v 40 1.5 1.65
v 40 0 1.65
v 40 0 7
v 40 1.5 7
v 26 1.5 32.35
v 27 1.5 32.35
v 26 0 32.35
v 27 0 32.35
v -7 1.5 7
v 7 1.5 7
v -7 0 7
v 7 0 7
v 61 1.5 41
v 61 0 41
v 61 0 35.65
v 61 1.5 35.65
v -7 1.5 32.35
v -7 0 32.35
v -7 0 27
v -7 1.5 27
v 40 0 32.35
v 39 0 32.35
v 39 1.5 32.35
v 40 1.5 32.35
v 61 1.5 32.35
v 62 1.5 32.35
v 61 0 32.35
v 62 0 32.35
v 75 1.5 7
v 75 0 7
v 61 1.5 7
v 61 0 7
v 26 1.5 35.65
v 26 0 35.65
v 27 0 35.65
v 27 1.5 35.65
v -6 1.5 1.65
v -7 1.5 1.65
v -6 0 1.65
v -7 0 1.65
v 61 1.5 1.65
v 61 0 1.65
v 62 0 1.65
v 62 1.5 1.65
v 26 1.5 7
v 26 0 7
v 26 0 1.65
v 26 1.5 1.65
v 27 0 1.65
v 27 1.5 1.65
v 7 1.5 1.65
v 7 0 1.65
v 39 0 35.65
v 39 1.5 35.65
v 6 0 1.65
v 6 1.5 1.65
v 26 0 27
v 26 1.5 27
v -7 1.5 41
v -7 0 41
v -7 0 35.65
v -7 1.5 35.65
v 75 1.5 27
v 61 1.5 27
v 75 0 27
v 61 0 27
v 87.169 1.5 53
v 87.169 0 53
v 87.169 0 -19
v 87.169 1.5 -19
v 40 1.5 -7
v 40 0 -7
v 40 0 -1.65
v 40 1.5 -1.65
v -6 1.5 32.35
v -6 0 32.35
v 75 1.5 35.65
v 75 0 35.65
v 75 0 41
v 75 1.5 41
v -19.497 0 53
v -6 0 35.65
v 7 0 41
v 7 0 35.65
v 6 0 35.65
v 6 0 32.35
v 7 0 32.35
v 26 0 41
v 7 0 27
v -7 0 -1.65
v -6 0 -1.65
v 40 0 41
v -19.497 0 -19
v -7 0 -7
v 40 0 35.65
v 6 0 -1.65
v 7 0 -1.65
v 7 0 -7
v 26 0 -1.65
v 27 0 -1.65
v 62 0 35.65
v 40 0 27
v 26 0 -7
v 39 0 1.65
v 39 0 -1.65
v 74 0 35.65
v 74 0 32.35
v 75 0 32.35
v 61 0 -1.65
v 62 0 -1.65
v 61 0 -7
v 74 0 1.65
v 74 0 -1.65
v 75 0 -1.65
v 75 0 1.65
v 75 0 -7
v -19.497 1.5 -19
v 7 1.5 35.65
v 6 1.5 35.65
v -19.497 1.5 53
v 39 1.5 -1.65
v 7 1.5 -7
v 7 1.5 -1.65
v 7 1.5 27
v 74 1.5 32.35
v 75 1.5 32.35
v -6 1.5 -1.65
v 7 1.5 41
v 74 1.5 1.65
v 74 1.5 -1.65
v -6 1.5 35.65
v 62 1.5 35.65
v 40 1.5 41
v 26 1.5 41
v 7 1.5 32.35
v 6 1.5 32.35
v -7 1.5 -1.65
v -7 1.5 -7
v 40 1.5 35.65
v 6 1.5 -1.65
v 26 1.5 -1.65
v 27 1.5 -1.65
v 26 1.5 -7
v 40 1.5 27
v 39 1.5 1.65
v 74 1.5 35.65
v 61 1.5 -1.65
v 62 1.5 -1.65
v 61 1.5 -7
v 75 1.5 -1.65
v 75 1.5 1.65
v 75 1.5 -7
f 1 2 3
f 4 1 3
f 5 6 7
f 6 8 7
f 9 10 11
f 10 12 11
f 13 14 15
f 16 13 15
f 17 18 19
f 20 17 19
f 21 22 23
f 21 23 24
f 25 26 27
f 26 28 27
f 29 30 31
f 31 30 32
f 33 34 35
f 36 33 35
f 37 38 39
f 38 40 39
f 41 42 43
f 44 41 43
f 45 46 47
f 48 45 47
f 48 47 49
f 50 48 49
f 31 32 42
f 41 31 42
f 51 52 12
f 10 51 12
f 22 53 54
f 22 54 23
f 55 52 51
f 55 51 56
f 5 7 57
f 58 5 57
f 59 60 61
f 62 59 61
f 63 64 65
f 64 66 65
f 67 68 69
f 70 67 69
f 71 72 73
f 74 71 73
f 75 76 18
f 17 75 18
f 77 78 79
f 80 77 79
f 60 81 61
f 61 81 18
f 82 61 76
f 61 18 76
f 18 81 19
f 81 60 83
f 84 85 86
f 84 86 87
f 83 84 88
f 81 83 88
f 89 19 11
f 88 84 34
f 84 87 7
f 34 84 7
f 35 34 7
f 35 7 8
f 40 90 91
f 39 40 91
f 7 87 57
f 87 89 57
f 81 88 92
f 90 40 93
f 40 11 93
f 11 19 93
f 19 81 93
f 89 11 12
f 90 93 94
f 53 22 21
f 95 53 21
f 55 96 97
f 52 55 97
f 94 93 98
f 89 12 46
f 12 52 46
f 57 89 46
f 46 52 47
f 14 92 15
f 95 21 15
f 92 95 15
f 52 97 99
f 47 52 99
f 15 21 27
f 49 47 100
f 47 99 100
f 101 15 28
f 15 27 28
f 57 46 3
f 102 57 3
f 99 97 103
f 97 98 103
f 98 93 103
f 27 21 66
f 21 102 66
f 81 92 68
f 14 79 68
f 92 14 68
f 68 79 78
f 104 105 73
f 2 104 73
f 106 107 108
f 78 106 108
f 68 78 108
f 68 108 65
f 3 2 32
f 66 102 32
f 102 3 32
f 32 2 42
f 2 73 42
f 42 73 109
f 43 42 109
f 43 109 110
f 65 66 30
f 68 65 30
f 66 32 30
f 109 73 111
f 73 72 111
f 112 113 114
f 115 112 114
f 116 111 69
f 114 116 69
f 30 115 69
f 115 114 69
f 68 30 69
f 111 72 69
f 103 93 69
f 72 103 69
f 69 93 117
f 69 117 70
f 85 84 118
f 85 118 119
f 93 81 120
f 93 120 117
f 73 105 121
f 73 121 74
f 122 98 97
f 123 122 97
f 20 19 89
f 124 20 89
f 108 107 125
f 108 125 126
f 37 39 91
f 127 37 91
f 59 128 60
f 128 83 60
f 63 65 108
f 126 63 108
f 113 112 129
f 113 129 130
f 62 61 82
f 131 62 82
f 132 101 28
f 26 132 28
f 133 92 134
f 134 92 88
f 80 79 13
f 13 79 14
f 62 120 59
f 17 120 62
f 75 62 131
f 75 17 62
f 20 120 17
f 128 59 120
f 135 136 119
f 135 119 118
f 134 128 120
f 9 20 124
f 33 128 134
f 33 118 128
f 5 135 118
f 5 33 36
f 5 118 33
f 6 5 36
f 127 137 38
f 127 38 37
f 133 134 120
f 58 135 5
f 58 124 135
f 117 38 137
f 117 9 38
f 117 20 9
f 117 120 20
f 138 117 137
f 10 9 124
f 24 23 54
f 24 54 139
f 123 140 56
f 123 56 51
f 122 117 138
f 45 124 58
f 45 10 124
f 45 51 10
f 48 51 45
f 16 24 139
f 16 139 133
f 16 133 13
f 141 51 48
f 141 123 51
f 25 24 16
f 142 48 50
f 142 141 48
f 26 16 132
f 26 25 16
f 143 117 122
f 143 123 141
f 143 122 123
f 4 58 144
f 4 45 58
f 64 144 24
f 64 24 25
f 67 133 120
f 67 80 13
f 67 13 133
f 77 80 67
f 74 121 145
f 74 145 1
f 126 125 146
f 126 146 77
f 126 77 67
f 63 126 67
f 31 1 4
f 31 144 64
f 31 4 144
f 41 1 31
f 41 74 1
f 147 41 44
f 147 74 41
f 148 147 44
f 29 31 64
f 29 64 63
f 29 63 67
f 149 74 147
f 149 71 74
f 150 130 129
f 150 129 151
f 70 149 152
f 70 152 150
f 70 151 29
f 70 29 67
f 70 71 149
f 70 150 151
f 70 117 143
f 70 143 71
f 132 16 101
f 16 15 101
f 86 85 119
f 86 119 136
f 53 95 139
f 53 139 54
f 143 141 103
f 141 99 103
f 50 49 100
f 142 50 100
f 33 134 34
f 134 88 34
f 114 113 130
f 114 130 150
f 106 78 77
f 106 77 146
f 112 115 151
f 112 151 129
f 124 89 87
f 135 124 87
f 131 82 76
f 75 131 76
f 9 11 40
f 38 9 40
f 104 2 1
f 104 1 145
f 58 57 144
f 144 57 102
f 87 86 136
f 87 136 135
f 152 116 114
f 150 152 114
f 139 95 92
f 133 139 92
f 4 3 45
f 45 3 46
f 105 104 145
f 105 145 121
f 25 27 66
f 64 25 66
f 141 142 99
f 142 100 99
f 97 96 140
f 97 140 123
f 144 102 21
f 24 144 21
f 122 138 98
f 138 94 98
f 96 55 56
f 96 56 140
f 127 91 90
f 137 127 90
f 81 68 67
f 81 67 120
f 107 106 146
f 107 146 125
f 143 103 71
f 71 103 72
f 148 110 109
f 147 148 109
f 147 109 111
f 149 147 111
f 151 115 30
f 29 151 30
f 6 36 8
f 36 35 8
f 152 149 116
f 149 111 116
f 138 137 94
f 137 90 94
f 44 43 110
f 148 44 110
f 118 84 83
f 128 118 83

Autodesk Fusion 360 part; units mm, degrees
sketch "Skizze1" plane through (0, 0, 0) normal (0, 1, 0) x (1, 0, 0)
  line L0 (7, -7) -> (-7, -7)
  line L1 (-7, -7) -> (-7, 7)
  line L2 (-7, 7) -> (7, 7)
  line L3 (7, 7) -> (7, -7)
  line L4 (7, -7) -> (-7, 7) construction
  line L5 (-7, -7) -> (7, 7) construction
  line L6 (6, 1.65) -> (7, 1.65)
  line L7 (7, 1.65) -> (7, -1.65)
  line L8 (7, -1.65) -> (6, -1.65)
  line L9 (6, -1.65) -> (6, 1.65)
  line L10 (0, 0) -> (-0.0828, 0.0828)
  line L11 (0, 0) -> (0, 4.3114) construction
  line L12 (-7, -1.65) -> (-6, -1.65)
  line L13 (-6, -1.65) -> (-6, 1.65)
  line L14 (-7, 1.65) -> (-7, -1.65)
  line L15 (-6, 1.65) -> (-7, 1.65)
  line L16 (8, -8) -> (-8, -8) construction
  line L17 (-8, -8) -> (-8, 8) construction
  line L18 (-8, 8) -> (8, 8) construction
  line L19 (8, 8) -> (8, -8) construction
  line L20 (8, -8) -> (-8, 8) construction
  line L21 (-8, -8) -> (8, 8) construction
  line L22 (9, -9) -> (-9, -9)
  line L23 (-9, -9) -> (-9, 9)
  line L24 (-9, 9) -> (9, 9)
  line L25 (9, 9) -> (9, -9)
  line L26 (9, -9) -> (-9, 9) construction
  line L27 (-9, -9) -> (9, 9) construction
  line L28 (7, 7) -> (9, 7) construction
  line L29 (25, 8) -> (41, 8) construction
  line L30 (42, 9) -> (42, -9)
  line L31 (40, -7) -> (26, -7)
  line L32 (40, -7) -> (26, 7) construction
  line L33 (25, -8) -> (41, 8) construction
  line L34 (24, 9) -> (42, 9)
  line L35 (26, -7) -> (26, 7)
  line L36 (42, -9) -> (24, -9)
  line L37 (40, -1.65) -> (39, -1.65)
  line L38 (39, 1.65) -> (40, 1.65)
  line L39 (33, 0) -> (33, 4.3114) construction
  line L40 (39, -1.65) -> (39, 1.65)
  line L41 (40, 7) -> (40, -7)
  line L42 (33, 0) -> (32.9172, 0.0828)
  line L43 (40, 1.65) -> (40, -1.65)
  line L44 (41, 8) -> (41, -8) construction
  line L45 (25, -8) -> (25, 8) construction
  line L46 (40, 7) -> (42, 7) construction
  line L47 (27, -1.65) -> (27, 1.65)
  line L48 (41, -8) -> (25, 8) construction
  line L49 (41, -8) -> (25, -8) construction
  line L50 (26, -7) -> (40, 7) construction
  line L51 (26, 7) -> (40, 7)
  line L52 (42, -9) -> (24, 9) construction
  line L53 (26, 1.65) -> (26, -1.65)
  line L54 (26, -1.65) -> (27, -1.65)
  line L55 (24, -9) -> (24, 9)
  line L56 (27, 1.65) -> (26, 1.65)
  line L57 (24, -9) -> (42, 9) construction
  line L58 (33, -34) -> (33, -29.6886) construction
  line L59 (41, -42) -> (25, -26) construction
  line L60 (40, -41) -> (26, -27) construction
  line L61 (25, -42) -> (41, -26) construction
  line L62 (39, -35.65) -> (39, -32.35)
  line L63 (24, -43) -> (42, -25) construction
  line L64 (24, -25) -> (42, -25)
  line L65 (24, -43) -> (24, -25)
  line L66 (26, -41) -> (40, -27) construction
  line L67 (40, -27) -> (42, -27) construction
  line L68 (41, -26) -> (41, -42) construction
  line L69 (26, -32.35) -> (26, -35.65)
  line L70 (25, -42) -> (25, -26) construction
  line L71 (41, -42) -> (25, -42) construction
  line L72 (27, -35.65) -> (27, -32.35)
  line L73 (40, -35.65) -> (39, -35.65)
  line L74 (42, -43) -> (24, -43)
  line L75 (40, -41) -> (26, -41)
  line L76 (26, -41) -> (26, -27)
  line L77 (26, -35.65) -> (27, -35.65)
  line L78 (42, -43) -> (24, -25) construction
  line L79 (27, -32.35) -> (26, -32.35)
  line L80 (25, -26) -> (41, -26) construction
  line L81 (42, -25) -> (42, -43)
  line L82 (9, -43) -> (-9, -25) construction
  line L83 (8, -42) -> (-8, -42) construction
  line L84 (39, -32.35) -> (40, -32.35)
  line L85 (40, -32.35) -> (40, -35.65)
  line L86 (0, -34) -> (-0.0828, -33.9172)
  line L87 (-7, -35.65) -> (-6, -35.65)
  line L88 (8, -26) -> (8, -42) construction
  line L89 (6, -32.35) -> (7, -32.35)
  line L90 (0, -34) -> (0, -29.6886) construction
  line L91 (-9, -43) -> (9, -25) construction
  line L92 (7, -32.35) -> (7, -35.65)
  line L93 (7, -35.65) -> (6, -35.65)
  line L94 (7, -27) -> (7, -41)
  line L95 (6, -35.65) -> (6, -32.35)
  line L96 (-6, -32.35) -> (-7, -32.35)
  line L97 (-9, -43) -> (-9, -25)
  line L98 (9, -25) -> (9, -43)
  line L99 (-8, -26) -> (8, -26) construction
  line L100 (-8, -42) -> (-8, -26) construction
  line L101 (7, -41) -> (-7, -27) construction
  line L102 (-9, -25) -> (9, -25)
  line L103 (7, -27) -> (9, -27) construction
  line L104 (-7, -41) -> (-7, -27)
  line L105 (8, -42) -> (-8, -26) construction
  line L106 (-7, -32.35) -> (-7, -35.65)
  line L107 (-7, -27) -> (7, -27)
  line L108 (-6, -35.65) -> (-6, -32.35)
  line L109 (7, -41) -> (-7, -41)
  line L110 (-8, -42) -> (8, -26) construction
  line L111 (-7, -41) -> (7, -27) construction
  line L112 (9, -43) -> (-9, -43)
  line L113 (33, -34) -> (32.9172, -33.9172)
  line L114 (40, -27) -> (40, -41)
  line L115 (26, -27) -> (40, -27)
  line L116 (68, -34) -> (67.9172, -33.9172)
  line L117 (60, -42) -> (60, -26) construction
  line L118 (61, -41) -> (61, -27)
  line L119 (61, -35.65) -> (62, -35.65)
  line L120 (62, -32.35) -> (61, -32.35)
  line L121 (61, -32.35) -> (61, -35.65)
  line L122 (68, -34) -> (68, -29.6886) construction
  line L123 (61, -7) -> (61, 7)
  line L124 (62, -35.65) -> (62, -32.35)
  line L125 (59, -43) -> (59, -25)
  line L126 (68, 0) -> (68, 4.3114) construction
  line L127 (68, 0) -> (67.9172, 0.0828)
  line L128 (61, -7) -> (75, 7) construction
  line L129 (59, -9) -> (59, 9)
  line L130 (62, -1.65) -> (62, 1.65)
  line L131 (61, -1.65) -> (62, -1.65)
  line L132 (75, -7) -> (61, 7) construction
  line L133 (62, 1.65) -> (61, 1.65)
  line L134 (61, 1.65) -> (61, -1.65)
  line L135 (60, -8) -> (60, 8) construction
  line L136 (77, -25) -> (77, -43)
  line L137 (74, -32.35) -> (75, -32.35)
  line L138 (77, -9) -> (59, 9) construction
  line L139 (75, -32.35) -> (75, -35.65)
  line L140 (75, -35.65) -> (74, -35.65)
  line L141 (75, -27) -> (75, -41)
  line L142 (76, -26) -> (76, -42) construction
  line L143 (76, -8) -> (60, 8) construction
  line L144 (74, -35.65) -> (74, -32.35)
  line L145 (75, -27) -> (77, -27) construction
  line L146 (59, -9) -> (77, 9) construction
  line L147 (74, 1.65) -> (75, 1.65)
  line L148 (60, -8) -> (76, 8) construction
  line L149 (76, -8) -> (60, -8) construction
  line L150 (60, -26) -> (76, -26) construction
  line L151 (75, -41) -> (61, -41)
  line L152 (61, -27) -> (75, -27)
  line L153 (60, -42) -> (76, -26) construction
  line L154 (76, -42) -> (60, -26) construction
  line L155 (77, -9) -> (59, -9)
  line L156 (75, 7) -> (77, 7) construction
  line L157 (59, 9) -> (77, 9)
  line L158 (76, 8) -> (76, -8) construction
  line L159 (59, -25) -> (77, -25)
  line L160 (75, 1.65) -> (75, -1.65)
  line L161 (61, -41) -> (75, -27) construction
  line L162 (77, 9) -> (77, -9)
  line L163 (76, -42) -> (60, -42) construction
  line L164 (60, 8) -> (76, 8) construction
  line L165 (77, -43) -> (59, -25) construction
  line L166 (75, -1.65) -> (74, -1.65)
  line L167 (75, -41) -> (61, -27) construction
  line L168 (59, -43) -> (77, -25) construction
  line L169 (77, -43) -> (59, -43)
  line L170 (61, 7) -> (75, 7)
  line L171 (75, 7) -> (75, -7)
  line L172 (74, -1.65) -> (74, 1.65)
  line L173 (75, -7) -> (61, -7)
  line L174 (-9, -9) -> (77, -9)
  line L175 (77, -9) -> (77, -25)
  line L176 (77, -25) -> (-9, -25)
  line L177 (-9, -25) -> (-9, -9)
  line L178 (42, 9) -> (59, 9)
  line L179 (59, 9) -> (59, -9)
  line L180 (59, -9) -> (42, -9)
  line L181 (42, -9) -> (42, 9)
  line L182 (9, 9) -> (24, 9)
  line L183 (24, 9) -> (24, -9)
  line L184 (24, -9) -> (9, -9)
  line L185 (9, -9) -> (9, 9)
  line L186 (9, -25) -> (24, -25)
  line L187 (24, -25) -> (24, -43)
  line L188 (24, -43) -> (9, -43)
  line L189 (9, -43) -> (9, -25)
  line L190 (42, -25) -> (59, -25)
  line L191 (59, -25) -> (59, -43)
  line L192 (59, -43) -> (42, -43)
  line L193 (42, -43) -> (42, -25)
  line L194 (-9, -43) -> (77, -43)
  line L195 (77, -43) -> (77, -53)
  line L196 (77, -53) -> (-9, -53)
  line L197 (-9, -53) -> (-9, -43)
  line L198 (77, 9) -> (-9, 9)
  line L199 (-9, 9) -> (-9, 19)
  line L200 (-9, 19) -> (77, 19)
  line L201 (77, 19) -> (77, 9)
  line L202 (77, 19) -> (77, 19)
  line L203 (77, 19) -> (77, -53)
  line L204 (77, -53) -> (77, -53)
  line L205 (77, -53) -> (77, 19)
  line L206 (77, -53) -> (87.1689, -53)
  line L207 (87.1689, -53) -> (87.1689, 19)
  line L208 (87.1689, 19) -> (77, 19)
  line L209 (77, 19) -> (77, -53)
  line L210 (-9, -53) -> (-19.4967, -53)
  line L211 (-19.4967, -53) -> (-19.4967, 19)
  line L212 (-19.4967, 19) -> (-9, 19)
  line L213 (-9, 19) -> (-9, -53)
  point P0 (33, 0)
  point P1 (33, 0)
  point P2 (33, 0)
  point P3 (0, -34)
  point P4 (0, -34)
  point P5 (0, -34)
  point P6 (33, -34)
  point P7 (33, -34)
  point P8 (33, -34)
  point P9 (68, 0)
  point P10 (68, 0)
  point P11 (68, 0)
  point P12 (68, -34)
  point P13 (68, -34)
  point P14 (68, -34)
  dimension "d1" = 14
  dimension "d2" = 14
  dimension "d6" = 1
  dimension "d7" = 3.3
  dimension "d8" = 16
  dimension "d9" = 16
  dimension "d10" = 18
  dimension "d11" = 18
  dimension "d13" = 2
  dimension "d19" = 14
  dimension "d20" = 14
  dimension "d21" = 1
  dimension "d22" = 3.3
  dimension "d23" = 16
  dimension "d24" = 16
  dimension "d25" = 18
  dimension "d26" = 18
  dimension "d27" = 2
  dimension "d28" = 14
  dimension "d29" = 14
  dimension "d30" = 1
  dimension "d31" = 3.3
  dimension "d32" = 16
  dimension "d33" = 16
  dimension "d34" = 18
  dimension "d35" = 18
  dimension "d36" = 2
  dimension "d37" = 14
  dimension "d38" = 14
  dimension "d39" = 1
  dimension "d40" = 3.3
  dimension "d41" = 16
  dimension "d42" = 16
  dimension "d43" = 18
  dimension "d44" = 18
  dimension "d45" = 2
  dimension "d46" = 14
  dimension "d47" = 14
  dimension "d48" = 1
  dimension "d49" = 3.3
  dimension "d50" = 16
  dimension "d51" = 16
  dimension "d52" = 18
  dimension "d53" = 18
  dimension "d54" = 2
  dimension "d55" = 14
  dimension "d56" = 14
  dimension "d57" = 1
  dimension "d58" = 3.3
  dimension "d59" = 16
  dimension "d60" = 16
  dimension "d61" = 18
  dimension "d62" = 18
  dimension "d63" = 2
extrude "Extrusion2" add sketch "Skizze1" along normal blind 1.5 contours L3 L6 L7 L8 L9 | L1 L12 L13 L14 L15 | L22 L36 L64 L102 L155 L159 L174 L175 L176 L177 L180 L184 L186 L190 L203 L205 L209 L213 | L22 L23 L24 L25 L174 L185 L198 L213 | L25 L55 L174 L182 L183 L184 L185 L198 | L23 L97 L177 L197 L199 L210 L211 L212 L213 | L24 L34 L157 L178 L182 L198 L199 L200 L201 L203 L205 L209 L213 | L30 L34 L36 L55 L174 L181 L183 L198 | L97 L98 L102 L112 L176 L189 L194 L213 | L30 L129 L174 L178 L179 L180 L181 L198 | L74 L112 L169 L188 L192 L194 L195 L196 L197 L203 L205 L209 L213 | L65 L98 L176 L186 L187 L188 L189 L194 | L129 L155 L157 L162 L174 L179 L198 L203 L205 L209 | L136 L162 L175 L195 L201 L203 L205 L206 L207 L208 L209 | L64 L65 L74 L81 L176 L187 L193 L194 | L81 L125 L176 L190 L191 L192 L193 L194 | L125 L136 L159 L169 L176 L191 L194 L203 L205 L209 | L37 L38 L40 L41 L43 | L35 L47 L53 L54 L56 | L62 L73 L84 L85 L114 | L69 L72 L76 L77 L79 | L87 L96 L104 L106 L108 | L89 L92 L93 L94 L95 | L118 L119 L120 L121 L124 | L137 L139 L140 L141 L144 | L123 L130 L131 L133 L134 | L147 L160 L166 L171 L172
extrude "Extrusion1" [suppressed]
chamfer "Fase1" [suppressed]
equation "d11 = d10"
equation "d26 = d10"
equation "d35 = d10"
equation "d44 = d10"
equation "d53 = d10"
equation "d62 = d10"
